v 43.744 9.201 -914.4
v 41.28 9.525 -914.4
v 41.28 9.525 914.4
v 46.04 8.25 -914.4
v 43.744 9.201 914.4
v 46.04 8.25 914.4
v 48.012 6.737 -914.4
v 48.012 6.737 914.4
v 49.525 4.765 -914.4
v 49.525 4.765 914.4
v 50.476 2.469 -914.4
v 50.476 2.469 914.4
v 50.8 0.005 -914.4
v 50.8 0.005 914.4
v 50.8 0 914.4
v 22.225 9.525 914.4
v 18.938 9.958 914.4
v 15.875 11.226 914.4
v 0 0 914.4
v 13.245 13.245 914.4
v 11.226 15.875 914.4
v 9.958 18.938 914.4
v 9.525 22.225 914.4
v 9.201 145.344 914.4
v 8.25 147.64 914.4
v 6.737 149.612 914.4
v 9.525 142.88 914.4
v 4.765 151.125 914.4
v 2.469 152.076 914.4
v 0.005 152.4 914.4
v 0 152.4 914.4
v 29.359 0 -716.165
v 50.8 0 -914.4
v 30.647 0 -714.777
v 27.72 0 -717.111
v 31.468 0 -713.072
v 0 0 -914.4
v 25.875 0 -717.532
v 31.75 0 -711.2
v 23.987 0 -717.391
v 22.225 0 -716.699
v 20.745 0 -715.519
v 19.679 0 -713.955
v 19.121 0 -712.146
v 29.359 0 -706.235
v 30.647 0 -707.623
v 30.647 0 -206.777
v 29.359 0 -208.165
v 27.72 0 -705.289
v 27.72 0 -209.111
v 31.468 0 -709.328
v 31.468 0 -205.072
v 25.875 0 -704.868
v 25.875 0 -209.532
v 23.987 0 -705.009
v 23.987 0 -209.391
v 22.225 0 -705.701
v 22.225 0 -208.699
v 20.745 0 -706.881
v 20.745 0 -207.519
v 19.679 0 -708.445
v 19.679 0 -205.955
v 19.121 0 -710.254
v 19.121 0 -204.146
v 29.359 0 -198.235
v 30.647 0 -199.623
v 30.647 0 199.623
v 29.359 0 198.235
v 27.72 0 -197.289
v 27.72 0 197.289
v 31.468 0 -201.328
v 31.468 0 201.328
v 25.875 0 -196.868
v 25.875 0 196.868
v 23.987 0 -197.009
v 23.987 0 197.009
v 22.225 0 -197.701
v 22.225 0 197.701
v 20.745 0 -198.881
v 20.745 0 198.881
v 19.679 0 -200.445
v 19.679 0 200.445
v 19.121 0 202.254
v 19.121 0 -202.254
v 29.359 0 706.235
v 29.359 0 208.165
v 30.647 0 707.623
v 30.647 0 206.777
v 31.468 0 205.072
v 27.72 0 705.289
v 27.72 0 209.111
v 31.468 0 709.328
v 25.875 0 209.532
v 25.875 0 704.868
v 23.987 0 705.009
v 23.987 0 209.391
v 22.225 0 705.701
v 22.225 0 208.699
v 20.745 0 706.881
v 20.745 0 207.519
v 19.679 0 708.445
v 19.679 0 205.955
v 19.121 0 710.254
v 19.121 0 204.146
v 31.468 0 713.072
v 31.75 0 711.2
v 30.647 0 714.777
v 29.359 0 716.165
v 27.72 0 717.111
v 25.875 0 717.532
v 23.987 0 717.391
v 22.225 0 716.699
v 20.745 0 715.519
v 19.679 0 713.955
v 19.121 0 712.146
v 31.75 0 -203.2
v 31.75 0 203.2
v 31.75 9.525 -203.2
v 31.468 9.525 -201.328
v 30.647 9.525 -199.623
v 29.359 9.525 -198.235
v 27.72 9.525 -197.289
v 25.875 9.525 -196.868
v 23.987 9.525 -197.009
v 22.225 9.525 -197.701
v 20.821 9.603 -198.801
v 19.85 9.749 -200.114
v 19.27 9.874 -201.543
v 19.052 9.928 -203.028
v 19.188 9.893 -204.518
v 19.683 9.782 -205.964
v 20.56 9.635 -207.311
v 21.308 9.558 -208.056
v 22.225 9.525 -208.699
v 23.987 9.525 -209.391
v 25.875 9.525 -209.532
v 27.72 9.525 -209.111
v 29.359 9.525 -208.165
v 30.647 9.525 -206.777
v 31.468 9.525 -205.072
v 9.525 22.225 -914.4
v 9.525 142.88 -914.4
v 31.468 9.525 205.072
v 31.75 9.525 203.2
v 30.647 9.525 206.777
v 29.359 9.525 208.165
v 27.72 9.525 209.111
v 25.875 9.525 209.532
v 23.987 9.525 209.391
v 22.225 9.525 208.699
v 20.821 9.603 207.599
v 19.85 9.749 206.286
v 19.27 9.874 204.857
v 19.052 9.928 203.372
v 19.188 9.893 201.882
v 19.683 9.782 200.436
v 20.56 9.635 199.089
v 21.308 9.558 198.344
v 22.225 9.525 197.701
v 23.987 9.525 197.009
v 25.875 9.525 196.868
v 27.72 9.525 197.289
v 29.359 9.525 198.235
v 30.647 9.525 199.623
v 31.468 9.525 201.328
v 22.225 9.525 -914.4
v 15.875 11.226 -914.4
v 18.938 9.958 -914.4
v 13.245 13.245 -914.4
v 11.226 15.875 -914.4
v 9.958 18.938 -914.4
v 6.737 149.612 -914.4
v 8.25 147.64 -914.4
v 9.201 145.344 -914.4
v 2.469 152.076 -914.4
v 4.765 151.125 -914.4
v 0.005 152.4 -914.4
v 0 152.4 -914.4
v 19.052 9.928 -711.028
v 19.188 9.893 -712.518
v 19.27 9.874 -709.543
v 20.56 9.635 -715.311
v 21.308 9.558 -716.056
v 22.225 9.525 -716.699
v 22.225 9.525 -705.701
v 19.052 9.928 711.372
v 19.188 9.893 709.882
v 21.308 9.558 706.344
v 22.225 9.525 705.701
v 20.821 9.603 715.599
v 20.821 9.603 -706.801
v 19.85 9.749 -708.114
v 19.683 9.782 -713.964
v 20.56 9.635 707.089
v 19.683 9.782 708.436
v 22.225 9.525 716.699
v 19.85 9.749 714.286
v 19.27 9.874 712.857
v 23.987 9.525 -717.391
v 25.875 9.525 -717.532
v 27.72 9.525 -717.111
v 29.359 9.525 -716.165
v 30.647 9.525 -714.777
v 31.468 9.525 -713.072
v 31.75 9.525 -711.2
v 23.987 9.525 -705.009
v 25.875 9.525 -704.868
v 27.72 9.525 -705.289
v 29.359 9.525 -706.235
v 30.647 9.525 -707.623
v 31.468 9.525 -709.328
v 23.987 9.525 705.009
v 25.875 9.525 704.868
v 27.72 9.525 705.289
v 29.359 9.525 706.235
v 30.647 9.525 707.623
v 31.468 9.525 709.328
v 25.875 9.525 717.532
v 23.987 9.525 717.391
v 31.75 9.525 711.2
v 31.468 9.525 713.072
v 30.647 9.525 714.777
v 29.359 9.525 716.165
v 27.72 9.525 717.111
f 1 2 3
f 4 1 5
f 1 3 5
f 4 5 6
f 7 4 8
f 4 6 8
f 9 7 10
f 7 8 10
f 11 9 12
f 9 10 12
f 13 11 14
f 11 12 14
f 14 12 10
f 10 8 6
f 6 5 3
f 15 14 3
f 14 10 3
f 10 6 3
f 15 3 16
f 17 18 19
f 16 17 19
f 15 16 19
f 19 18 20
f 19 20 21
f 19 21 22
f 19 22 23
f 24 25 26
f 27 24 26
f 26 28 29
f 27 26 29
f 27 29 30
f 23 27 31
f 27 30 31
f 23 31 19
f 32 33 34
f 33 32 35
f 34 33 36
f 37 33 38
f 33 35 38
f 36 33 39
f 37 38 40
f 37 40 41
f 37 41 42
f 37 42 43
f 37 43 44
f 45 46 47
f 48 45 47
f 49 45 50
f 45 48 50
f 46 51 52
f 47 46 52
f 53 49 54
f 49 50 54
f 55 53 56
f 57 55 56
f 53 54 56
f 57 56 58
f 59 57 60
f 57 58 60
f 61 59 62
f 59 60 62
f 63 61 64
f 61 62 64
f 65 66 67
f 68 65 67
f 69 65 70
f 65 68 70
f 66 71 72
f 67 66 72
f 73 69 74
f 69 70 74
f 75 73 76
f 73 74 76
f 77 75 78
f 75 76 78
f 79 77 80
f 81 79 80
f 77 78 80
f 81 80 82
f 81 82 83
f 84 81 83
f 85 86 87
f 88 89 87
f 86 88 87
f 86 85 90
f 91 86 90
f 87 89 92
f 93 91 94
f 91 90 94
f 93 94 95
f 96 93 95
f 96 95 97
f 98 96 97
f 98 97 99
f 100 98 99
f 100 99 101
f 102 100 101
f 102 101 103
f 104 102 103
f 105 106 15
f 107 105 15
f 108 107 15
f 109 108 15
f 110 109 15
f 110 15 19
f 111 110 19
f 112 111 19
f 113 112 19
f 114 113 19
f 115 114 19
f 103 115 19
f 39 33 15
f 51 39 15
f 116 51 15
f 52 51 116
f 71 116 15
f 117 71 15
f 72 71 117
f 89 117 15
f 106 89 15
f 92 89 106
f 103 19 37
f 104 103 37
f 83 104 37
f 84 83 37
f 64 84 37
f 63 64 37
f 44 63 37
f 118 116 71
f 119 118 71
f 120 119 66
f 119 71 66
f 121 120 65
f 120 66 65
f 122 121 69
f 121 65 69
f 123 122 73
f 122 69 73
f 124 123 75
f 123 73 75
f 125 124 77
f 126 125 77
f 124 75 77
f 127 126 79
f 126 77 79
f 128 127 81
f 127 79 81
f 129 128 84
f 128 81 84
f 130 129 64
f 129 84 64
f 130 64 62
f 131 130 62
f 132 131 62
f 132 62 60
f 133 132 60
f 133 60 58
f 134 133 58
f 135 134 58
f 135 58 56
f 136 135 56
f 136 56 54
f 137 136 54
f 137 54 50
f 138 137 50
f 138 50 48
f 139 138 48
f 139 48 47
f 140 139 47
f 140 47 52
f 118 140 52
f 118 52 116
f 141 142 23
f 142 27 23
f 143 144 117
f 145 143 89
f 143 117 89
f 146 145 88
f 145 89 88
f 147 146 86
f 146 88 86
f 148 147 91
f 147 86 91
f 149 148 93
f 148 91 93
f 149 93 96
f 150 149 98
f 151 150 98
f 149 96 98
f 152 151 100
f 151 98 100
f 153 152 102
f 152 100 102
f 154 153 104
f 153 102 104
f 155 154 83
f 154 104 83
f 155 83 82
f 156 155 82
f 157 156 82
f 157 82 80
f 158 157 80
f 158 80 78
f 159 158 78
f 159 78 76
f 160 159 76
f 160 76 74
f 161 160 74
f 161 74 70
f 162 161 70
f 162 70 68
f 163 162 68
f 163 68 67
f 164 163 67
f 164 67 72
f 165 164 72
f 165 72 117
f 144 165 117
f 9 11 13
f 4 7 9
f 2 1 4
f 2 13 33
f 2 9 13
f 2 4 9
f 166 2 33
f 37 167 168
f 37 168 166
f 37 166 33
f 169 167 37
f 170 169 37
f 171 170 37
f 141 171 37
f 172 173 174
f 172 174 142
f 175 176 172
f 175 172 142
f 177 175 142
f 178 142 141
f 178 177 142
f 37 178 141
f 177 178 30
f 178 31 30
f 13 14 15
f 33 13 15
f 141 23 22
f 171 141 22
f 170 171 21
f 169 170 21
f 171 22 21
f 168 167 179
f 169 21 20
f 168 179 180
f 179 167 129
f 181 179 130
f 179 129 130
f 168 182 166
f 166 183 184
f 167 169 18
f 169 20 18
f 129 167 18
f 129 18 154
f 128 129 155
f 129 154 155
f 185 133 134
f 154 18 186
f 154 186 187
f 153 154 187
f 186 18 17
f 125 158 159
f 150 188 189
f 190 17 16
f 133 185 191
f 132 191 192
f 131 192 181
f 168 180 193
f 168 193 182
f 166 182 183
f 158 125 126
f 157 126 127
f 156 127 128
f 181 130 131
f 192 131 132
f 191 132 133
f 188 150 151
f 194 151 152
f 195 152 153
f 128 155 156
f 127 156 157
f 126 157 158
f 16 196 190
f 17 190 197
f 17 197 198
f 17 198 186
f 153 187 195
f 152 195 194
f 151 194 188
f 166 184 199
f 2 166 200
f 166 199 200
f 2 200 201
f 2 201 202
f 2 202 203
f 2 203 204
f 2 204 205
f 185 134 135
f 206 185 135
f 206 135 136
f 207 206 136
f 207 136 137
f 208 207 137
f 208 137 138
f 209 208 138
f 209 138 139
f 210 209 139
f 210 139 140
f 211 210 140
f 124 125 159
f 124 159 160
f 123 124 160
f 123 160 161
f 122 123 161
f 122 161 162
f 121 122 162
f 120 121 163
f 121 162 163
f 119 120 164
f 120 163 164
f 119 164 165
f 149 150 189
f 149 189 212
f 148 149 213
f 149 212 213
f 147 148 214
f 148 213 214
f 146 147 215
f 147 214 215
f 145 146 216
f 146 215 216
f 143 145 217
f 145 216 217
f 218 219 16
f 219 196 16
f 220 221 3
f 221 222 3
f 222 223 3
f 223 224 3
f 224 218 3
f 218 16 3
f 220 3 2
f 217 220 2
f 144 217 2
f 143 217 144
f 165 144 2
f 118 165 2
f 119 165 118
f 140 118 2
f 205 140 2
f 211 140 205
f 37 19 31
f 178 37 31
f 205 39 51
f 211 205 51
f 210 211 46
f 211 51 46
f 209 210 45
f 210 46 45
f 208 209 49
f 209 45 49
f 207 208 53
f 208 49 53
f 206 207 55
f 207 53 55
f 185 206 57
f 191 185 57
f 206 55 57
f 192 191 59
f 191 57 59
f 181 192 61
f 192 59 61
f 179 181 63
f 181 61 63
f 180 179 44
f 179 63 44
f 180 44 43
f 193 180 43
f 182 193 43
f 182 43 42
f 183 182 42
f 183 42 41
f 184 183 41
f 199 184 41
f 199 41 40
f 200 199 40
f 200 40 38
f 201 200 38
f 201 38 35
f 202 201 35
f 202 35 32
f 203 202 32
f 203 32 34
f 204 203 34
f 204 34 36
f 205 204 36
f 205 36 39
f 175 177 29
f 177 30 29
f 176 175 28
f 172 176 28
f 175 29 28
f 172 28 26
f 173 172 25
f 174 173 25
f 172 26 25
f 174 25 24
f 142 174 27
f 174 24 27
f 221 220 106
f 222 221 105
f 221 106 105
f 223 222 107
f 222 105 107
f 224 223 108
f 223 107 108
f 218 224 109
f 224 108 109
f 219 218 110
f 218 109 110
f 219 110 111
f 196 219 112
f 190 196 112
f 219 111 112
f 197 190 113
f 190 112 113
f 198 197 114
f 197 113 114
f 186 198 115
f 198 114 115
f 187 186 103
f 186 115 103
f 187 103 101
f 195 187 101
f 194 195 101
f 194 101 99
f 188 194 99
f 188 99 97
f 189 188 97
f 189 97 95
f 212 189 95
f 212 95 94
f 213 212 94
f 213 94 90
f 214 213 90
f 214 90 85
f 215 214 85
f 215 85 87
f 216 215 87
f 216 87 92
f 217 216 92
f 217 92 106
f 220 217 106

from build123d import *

# Parameters (mm, degrees)
BOSS_EXTRUDE1_DEPTH = 914.4
SKETCH2_R           = 6.35
CUT_EXTRUDE1_DEPTH  = 153.4


with BuildPart() as part:
    # Sketch1 → Boss-Extrude1 (new body, symmetric)
    with BuildSketch(Plane.XY):
        with BuildLine():
            Line((0, 0), (0, 152.4))
            Line((0, 152.4), (0.00508, 152.4))
            ThreePointArc((0.00508, 152.4), (6.736679988, 149.611679988), (9.525, 142.88008))
            Line((9.525, 142.88008), (9.525, 22.225))
            ThreePointArc((9.525, 22.225), (13.244743879, 13.244743879), (22.225, 9.525))
            Line((22.225, 9.525), (41.28008, 9.525))
            ThreePointArc((41.28008, 9.525), (48.011679988, 6.736679988), (50.8, 0.00508))
            Line((50.8, 0.00508), (50.8, 0))
            Line((50.8, 0), (0, 0))
        make_face()
    extrude(amount=BOSS_EXTRUDE1_DEPTH, both=True)

    # Sketch2 → Cut-Extrude1 (cut, through all)
    with BuildSketch(Plane.XZ):
        with Locations((25.4, -711.2)):
            Circle(SKETCH2_R)
        with Locations((25.4, -203.2)):
            Circle(SKETCH2_R)
        with Locations((25.4, 203.2)):
            Circle(SKETCH2_R)
        with Locations((25.4, 711.2)):
            Circle(SKETCH2_R)
    extrude(amount=-CUT_EXTRUDE1_DEPTH, mode=Mode.SUBTRACT)


solid = part.part
